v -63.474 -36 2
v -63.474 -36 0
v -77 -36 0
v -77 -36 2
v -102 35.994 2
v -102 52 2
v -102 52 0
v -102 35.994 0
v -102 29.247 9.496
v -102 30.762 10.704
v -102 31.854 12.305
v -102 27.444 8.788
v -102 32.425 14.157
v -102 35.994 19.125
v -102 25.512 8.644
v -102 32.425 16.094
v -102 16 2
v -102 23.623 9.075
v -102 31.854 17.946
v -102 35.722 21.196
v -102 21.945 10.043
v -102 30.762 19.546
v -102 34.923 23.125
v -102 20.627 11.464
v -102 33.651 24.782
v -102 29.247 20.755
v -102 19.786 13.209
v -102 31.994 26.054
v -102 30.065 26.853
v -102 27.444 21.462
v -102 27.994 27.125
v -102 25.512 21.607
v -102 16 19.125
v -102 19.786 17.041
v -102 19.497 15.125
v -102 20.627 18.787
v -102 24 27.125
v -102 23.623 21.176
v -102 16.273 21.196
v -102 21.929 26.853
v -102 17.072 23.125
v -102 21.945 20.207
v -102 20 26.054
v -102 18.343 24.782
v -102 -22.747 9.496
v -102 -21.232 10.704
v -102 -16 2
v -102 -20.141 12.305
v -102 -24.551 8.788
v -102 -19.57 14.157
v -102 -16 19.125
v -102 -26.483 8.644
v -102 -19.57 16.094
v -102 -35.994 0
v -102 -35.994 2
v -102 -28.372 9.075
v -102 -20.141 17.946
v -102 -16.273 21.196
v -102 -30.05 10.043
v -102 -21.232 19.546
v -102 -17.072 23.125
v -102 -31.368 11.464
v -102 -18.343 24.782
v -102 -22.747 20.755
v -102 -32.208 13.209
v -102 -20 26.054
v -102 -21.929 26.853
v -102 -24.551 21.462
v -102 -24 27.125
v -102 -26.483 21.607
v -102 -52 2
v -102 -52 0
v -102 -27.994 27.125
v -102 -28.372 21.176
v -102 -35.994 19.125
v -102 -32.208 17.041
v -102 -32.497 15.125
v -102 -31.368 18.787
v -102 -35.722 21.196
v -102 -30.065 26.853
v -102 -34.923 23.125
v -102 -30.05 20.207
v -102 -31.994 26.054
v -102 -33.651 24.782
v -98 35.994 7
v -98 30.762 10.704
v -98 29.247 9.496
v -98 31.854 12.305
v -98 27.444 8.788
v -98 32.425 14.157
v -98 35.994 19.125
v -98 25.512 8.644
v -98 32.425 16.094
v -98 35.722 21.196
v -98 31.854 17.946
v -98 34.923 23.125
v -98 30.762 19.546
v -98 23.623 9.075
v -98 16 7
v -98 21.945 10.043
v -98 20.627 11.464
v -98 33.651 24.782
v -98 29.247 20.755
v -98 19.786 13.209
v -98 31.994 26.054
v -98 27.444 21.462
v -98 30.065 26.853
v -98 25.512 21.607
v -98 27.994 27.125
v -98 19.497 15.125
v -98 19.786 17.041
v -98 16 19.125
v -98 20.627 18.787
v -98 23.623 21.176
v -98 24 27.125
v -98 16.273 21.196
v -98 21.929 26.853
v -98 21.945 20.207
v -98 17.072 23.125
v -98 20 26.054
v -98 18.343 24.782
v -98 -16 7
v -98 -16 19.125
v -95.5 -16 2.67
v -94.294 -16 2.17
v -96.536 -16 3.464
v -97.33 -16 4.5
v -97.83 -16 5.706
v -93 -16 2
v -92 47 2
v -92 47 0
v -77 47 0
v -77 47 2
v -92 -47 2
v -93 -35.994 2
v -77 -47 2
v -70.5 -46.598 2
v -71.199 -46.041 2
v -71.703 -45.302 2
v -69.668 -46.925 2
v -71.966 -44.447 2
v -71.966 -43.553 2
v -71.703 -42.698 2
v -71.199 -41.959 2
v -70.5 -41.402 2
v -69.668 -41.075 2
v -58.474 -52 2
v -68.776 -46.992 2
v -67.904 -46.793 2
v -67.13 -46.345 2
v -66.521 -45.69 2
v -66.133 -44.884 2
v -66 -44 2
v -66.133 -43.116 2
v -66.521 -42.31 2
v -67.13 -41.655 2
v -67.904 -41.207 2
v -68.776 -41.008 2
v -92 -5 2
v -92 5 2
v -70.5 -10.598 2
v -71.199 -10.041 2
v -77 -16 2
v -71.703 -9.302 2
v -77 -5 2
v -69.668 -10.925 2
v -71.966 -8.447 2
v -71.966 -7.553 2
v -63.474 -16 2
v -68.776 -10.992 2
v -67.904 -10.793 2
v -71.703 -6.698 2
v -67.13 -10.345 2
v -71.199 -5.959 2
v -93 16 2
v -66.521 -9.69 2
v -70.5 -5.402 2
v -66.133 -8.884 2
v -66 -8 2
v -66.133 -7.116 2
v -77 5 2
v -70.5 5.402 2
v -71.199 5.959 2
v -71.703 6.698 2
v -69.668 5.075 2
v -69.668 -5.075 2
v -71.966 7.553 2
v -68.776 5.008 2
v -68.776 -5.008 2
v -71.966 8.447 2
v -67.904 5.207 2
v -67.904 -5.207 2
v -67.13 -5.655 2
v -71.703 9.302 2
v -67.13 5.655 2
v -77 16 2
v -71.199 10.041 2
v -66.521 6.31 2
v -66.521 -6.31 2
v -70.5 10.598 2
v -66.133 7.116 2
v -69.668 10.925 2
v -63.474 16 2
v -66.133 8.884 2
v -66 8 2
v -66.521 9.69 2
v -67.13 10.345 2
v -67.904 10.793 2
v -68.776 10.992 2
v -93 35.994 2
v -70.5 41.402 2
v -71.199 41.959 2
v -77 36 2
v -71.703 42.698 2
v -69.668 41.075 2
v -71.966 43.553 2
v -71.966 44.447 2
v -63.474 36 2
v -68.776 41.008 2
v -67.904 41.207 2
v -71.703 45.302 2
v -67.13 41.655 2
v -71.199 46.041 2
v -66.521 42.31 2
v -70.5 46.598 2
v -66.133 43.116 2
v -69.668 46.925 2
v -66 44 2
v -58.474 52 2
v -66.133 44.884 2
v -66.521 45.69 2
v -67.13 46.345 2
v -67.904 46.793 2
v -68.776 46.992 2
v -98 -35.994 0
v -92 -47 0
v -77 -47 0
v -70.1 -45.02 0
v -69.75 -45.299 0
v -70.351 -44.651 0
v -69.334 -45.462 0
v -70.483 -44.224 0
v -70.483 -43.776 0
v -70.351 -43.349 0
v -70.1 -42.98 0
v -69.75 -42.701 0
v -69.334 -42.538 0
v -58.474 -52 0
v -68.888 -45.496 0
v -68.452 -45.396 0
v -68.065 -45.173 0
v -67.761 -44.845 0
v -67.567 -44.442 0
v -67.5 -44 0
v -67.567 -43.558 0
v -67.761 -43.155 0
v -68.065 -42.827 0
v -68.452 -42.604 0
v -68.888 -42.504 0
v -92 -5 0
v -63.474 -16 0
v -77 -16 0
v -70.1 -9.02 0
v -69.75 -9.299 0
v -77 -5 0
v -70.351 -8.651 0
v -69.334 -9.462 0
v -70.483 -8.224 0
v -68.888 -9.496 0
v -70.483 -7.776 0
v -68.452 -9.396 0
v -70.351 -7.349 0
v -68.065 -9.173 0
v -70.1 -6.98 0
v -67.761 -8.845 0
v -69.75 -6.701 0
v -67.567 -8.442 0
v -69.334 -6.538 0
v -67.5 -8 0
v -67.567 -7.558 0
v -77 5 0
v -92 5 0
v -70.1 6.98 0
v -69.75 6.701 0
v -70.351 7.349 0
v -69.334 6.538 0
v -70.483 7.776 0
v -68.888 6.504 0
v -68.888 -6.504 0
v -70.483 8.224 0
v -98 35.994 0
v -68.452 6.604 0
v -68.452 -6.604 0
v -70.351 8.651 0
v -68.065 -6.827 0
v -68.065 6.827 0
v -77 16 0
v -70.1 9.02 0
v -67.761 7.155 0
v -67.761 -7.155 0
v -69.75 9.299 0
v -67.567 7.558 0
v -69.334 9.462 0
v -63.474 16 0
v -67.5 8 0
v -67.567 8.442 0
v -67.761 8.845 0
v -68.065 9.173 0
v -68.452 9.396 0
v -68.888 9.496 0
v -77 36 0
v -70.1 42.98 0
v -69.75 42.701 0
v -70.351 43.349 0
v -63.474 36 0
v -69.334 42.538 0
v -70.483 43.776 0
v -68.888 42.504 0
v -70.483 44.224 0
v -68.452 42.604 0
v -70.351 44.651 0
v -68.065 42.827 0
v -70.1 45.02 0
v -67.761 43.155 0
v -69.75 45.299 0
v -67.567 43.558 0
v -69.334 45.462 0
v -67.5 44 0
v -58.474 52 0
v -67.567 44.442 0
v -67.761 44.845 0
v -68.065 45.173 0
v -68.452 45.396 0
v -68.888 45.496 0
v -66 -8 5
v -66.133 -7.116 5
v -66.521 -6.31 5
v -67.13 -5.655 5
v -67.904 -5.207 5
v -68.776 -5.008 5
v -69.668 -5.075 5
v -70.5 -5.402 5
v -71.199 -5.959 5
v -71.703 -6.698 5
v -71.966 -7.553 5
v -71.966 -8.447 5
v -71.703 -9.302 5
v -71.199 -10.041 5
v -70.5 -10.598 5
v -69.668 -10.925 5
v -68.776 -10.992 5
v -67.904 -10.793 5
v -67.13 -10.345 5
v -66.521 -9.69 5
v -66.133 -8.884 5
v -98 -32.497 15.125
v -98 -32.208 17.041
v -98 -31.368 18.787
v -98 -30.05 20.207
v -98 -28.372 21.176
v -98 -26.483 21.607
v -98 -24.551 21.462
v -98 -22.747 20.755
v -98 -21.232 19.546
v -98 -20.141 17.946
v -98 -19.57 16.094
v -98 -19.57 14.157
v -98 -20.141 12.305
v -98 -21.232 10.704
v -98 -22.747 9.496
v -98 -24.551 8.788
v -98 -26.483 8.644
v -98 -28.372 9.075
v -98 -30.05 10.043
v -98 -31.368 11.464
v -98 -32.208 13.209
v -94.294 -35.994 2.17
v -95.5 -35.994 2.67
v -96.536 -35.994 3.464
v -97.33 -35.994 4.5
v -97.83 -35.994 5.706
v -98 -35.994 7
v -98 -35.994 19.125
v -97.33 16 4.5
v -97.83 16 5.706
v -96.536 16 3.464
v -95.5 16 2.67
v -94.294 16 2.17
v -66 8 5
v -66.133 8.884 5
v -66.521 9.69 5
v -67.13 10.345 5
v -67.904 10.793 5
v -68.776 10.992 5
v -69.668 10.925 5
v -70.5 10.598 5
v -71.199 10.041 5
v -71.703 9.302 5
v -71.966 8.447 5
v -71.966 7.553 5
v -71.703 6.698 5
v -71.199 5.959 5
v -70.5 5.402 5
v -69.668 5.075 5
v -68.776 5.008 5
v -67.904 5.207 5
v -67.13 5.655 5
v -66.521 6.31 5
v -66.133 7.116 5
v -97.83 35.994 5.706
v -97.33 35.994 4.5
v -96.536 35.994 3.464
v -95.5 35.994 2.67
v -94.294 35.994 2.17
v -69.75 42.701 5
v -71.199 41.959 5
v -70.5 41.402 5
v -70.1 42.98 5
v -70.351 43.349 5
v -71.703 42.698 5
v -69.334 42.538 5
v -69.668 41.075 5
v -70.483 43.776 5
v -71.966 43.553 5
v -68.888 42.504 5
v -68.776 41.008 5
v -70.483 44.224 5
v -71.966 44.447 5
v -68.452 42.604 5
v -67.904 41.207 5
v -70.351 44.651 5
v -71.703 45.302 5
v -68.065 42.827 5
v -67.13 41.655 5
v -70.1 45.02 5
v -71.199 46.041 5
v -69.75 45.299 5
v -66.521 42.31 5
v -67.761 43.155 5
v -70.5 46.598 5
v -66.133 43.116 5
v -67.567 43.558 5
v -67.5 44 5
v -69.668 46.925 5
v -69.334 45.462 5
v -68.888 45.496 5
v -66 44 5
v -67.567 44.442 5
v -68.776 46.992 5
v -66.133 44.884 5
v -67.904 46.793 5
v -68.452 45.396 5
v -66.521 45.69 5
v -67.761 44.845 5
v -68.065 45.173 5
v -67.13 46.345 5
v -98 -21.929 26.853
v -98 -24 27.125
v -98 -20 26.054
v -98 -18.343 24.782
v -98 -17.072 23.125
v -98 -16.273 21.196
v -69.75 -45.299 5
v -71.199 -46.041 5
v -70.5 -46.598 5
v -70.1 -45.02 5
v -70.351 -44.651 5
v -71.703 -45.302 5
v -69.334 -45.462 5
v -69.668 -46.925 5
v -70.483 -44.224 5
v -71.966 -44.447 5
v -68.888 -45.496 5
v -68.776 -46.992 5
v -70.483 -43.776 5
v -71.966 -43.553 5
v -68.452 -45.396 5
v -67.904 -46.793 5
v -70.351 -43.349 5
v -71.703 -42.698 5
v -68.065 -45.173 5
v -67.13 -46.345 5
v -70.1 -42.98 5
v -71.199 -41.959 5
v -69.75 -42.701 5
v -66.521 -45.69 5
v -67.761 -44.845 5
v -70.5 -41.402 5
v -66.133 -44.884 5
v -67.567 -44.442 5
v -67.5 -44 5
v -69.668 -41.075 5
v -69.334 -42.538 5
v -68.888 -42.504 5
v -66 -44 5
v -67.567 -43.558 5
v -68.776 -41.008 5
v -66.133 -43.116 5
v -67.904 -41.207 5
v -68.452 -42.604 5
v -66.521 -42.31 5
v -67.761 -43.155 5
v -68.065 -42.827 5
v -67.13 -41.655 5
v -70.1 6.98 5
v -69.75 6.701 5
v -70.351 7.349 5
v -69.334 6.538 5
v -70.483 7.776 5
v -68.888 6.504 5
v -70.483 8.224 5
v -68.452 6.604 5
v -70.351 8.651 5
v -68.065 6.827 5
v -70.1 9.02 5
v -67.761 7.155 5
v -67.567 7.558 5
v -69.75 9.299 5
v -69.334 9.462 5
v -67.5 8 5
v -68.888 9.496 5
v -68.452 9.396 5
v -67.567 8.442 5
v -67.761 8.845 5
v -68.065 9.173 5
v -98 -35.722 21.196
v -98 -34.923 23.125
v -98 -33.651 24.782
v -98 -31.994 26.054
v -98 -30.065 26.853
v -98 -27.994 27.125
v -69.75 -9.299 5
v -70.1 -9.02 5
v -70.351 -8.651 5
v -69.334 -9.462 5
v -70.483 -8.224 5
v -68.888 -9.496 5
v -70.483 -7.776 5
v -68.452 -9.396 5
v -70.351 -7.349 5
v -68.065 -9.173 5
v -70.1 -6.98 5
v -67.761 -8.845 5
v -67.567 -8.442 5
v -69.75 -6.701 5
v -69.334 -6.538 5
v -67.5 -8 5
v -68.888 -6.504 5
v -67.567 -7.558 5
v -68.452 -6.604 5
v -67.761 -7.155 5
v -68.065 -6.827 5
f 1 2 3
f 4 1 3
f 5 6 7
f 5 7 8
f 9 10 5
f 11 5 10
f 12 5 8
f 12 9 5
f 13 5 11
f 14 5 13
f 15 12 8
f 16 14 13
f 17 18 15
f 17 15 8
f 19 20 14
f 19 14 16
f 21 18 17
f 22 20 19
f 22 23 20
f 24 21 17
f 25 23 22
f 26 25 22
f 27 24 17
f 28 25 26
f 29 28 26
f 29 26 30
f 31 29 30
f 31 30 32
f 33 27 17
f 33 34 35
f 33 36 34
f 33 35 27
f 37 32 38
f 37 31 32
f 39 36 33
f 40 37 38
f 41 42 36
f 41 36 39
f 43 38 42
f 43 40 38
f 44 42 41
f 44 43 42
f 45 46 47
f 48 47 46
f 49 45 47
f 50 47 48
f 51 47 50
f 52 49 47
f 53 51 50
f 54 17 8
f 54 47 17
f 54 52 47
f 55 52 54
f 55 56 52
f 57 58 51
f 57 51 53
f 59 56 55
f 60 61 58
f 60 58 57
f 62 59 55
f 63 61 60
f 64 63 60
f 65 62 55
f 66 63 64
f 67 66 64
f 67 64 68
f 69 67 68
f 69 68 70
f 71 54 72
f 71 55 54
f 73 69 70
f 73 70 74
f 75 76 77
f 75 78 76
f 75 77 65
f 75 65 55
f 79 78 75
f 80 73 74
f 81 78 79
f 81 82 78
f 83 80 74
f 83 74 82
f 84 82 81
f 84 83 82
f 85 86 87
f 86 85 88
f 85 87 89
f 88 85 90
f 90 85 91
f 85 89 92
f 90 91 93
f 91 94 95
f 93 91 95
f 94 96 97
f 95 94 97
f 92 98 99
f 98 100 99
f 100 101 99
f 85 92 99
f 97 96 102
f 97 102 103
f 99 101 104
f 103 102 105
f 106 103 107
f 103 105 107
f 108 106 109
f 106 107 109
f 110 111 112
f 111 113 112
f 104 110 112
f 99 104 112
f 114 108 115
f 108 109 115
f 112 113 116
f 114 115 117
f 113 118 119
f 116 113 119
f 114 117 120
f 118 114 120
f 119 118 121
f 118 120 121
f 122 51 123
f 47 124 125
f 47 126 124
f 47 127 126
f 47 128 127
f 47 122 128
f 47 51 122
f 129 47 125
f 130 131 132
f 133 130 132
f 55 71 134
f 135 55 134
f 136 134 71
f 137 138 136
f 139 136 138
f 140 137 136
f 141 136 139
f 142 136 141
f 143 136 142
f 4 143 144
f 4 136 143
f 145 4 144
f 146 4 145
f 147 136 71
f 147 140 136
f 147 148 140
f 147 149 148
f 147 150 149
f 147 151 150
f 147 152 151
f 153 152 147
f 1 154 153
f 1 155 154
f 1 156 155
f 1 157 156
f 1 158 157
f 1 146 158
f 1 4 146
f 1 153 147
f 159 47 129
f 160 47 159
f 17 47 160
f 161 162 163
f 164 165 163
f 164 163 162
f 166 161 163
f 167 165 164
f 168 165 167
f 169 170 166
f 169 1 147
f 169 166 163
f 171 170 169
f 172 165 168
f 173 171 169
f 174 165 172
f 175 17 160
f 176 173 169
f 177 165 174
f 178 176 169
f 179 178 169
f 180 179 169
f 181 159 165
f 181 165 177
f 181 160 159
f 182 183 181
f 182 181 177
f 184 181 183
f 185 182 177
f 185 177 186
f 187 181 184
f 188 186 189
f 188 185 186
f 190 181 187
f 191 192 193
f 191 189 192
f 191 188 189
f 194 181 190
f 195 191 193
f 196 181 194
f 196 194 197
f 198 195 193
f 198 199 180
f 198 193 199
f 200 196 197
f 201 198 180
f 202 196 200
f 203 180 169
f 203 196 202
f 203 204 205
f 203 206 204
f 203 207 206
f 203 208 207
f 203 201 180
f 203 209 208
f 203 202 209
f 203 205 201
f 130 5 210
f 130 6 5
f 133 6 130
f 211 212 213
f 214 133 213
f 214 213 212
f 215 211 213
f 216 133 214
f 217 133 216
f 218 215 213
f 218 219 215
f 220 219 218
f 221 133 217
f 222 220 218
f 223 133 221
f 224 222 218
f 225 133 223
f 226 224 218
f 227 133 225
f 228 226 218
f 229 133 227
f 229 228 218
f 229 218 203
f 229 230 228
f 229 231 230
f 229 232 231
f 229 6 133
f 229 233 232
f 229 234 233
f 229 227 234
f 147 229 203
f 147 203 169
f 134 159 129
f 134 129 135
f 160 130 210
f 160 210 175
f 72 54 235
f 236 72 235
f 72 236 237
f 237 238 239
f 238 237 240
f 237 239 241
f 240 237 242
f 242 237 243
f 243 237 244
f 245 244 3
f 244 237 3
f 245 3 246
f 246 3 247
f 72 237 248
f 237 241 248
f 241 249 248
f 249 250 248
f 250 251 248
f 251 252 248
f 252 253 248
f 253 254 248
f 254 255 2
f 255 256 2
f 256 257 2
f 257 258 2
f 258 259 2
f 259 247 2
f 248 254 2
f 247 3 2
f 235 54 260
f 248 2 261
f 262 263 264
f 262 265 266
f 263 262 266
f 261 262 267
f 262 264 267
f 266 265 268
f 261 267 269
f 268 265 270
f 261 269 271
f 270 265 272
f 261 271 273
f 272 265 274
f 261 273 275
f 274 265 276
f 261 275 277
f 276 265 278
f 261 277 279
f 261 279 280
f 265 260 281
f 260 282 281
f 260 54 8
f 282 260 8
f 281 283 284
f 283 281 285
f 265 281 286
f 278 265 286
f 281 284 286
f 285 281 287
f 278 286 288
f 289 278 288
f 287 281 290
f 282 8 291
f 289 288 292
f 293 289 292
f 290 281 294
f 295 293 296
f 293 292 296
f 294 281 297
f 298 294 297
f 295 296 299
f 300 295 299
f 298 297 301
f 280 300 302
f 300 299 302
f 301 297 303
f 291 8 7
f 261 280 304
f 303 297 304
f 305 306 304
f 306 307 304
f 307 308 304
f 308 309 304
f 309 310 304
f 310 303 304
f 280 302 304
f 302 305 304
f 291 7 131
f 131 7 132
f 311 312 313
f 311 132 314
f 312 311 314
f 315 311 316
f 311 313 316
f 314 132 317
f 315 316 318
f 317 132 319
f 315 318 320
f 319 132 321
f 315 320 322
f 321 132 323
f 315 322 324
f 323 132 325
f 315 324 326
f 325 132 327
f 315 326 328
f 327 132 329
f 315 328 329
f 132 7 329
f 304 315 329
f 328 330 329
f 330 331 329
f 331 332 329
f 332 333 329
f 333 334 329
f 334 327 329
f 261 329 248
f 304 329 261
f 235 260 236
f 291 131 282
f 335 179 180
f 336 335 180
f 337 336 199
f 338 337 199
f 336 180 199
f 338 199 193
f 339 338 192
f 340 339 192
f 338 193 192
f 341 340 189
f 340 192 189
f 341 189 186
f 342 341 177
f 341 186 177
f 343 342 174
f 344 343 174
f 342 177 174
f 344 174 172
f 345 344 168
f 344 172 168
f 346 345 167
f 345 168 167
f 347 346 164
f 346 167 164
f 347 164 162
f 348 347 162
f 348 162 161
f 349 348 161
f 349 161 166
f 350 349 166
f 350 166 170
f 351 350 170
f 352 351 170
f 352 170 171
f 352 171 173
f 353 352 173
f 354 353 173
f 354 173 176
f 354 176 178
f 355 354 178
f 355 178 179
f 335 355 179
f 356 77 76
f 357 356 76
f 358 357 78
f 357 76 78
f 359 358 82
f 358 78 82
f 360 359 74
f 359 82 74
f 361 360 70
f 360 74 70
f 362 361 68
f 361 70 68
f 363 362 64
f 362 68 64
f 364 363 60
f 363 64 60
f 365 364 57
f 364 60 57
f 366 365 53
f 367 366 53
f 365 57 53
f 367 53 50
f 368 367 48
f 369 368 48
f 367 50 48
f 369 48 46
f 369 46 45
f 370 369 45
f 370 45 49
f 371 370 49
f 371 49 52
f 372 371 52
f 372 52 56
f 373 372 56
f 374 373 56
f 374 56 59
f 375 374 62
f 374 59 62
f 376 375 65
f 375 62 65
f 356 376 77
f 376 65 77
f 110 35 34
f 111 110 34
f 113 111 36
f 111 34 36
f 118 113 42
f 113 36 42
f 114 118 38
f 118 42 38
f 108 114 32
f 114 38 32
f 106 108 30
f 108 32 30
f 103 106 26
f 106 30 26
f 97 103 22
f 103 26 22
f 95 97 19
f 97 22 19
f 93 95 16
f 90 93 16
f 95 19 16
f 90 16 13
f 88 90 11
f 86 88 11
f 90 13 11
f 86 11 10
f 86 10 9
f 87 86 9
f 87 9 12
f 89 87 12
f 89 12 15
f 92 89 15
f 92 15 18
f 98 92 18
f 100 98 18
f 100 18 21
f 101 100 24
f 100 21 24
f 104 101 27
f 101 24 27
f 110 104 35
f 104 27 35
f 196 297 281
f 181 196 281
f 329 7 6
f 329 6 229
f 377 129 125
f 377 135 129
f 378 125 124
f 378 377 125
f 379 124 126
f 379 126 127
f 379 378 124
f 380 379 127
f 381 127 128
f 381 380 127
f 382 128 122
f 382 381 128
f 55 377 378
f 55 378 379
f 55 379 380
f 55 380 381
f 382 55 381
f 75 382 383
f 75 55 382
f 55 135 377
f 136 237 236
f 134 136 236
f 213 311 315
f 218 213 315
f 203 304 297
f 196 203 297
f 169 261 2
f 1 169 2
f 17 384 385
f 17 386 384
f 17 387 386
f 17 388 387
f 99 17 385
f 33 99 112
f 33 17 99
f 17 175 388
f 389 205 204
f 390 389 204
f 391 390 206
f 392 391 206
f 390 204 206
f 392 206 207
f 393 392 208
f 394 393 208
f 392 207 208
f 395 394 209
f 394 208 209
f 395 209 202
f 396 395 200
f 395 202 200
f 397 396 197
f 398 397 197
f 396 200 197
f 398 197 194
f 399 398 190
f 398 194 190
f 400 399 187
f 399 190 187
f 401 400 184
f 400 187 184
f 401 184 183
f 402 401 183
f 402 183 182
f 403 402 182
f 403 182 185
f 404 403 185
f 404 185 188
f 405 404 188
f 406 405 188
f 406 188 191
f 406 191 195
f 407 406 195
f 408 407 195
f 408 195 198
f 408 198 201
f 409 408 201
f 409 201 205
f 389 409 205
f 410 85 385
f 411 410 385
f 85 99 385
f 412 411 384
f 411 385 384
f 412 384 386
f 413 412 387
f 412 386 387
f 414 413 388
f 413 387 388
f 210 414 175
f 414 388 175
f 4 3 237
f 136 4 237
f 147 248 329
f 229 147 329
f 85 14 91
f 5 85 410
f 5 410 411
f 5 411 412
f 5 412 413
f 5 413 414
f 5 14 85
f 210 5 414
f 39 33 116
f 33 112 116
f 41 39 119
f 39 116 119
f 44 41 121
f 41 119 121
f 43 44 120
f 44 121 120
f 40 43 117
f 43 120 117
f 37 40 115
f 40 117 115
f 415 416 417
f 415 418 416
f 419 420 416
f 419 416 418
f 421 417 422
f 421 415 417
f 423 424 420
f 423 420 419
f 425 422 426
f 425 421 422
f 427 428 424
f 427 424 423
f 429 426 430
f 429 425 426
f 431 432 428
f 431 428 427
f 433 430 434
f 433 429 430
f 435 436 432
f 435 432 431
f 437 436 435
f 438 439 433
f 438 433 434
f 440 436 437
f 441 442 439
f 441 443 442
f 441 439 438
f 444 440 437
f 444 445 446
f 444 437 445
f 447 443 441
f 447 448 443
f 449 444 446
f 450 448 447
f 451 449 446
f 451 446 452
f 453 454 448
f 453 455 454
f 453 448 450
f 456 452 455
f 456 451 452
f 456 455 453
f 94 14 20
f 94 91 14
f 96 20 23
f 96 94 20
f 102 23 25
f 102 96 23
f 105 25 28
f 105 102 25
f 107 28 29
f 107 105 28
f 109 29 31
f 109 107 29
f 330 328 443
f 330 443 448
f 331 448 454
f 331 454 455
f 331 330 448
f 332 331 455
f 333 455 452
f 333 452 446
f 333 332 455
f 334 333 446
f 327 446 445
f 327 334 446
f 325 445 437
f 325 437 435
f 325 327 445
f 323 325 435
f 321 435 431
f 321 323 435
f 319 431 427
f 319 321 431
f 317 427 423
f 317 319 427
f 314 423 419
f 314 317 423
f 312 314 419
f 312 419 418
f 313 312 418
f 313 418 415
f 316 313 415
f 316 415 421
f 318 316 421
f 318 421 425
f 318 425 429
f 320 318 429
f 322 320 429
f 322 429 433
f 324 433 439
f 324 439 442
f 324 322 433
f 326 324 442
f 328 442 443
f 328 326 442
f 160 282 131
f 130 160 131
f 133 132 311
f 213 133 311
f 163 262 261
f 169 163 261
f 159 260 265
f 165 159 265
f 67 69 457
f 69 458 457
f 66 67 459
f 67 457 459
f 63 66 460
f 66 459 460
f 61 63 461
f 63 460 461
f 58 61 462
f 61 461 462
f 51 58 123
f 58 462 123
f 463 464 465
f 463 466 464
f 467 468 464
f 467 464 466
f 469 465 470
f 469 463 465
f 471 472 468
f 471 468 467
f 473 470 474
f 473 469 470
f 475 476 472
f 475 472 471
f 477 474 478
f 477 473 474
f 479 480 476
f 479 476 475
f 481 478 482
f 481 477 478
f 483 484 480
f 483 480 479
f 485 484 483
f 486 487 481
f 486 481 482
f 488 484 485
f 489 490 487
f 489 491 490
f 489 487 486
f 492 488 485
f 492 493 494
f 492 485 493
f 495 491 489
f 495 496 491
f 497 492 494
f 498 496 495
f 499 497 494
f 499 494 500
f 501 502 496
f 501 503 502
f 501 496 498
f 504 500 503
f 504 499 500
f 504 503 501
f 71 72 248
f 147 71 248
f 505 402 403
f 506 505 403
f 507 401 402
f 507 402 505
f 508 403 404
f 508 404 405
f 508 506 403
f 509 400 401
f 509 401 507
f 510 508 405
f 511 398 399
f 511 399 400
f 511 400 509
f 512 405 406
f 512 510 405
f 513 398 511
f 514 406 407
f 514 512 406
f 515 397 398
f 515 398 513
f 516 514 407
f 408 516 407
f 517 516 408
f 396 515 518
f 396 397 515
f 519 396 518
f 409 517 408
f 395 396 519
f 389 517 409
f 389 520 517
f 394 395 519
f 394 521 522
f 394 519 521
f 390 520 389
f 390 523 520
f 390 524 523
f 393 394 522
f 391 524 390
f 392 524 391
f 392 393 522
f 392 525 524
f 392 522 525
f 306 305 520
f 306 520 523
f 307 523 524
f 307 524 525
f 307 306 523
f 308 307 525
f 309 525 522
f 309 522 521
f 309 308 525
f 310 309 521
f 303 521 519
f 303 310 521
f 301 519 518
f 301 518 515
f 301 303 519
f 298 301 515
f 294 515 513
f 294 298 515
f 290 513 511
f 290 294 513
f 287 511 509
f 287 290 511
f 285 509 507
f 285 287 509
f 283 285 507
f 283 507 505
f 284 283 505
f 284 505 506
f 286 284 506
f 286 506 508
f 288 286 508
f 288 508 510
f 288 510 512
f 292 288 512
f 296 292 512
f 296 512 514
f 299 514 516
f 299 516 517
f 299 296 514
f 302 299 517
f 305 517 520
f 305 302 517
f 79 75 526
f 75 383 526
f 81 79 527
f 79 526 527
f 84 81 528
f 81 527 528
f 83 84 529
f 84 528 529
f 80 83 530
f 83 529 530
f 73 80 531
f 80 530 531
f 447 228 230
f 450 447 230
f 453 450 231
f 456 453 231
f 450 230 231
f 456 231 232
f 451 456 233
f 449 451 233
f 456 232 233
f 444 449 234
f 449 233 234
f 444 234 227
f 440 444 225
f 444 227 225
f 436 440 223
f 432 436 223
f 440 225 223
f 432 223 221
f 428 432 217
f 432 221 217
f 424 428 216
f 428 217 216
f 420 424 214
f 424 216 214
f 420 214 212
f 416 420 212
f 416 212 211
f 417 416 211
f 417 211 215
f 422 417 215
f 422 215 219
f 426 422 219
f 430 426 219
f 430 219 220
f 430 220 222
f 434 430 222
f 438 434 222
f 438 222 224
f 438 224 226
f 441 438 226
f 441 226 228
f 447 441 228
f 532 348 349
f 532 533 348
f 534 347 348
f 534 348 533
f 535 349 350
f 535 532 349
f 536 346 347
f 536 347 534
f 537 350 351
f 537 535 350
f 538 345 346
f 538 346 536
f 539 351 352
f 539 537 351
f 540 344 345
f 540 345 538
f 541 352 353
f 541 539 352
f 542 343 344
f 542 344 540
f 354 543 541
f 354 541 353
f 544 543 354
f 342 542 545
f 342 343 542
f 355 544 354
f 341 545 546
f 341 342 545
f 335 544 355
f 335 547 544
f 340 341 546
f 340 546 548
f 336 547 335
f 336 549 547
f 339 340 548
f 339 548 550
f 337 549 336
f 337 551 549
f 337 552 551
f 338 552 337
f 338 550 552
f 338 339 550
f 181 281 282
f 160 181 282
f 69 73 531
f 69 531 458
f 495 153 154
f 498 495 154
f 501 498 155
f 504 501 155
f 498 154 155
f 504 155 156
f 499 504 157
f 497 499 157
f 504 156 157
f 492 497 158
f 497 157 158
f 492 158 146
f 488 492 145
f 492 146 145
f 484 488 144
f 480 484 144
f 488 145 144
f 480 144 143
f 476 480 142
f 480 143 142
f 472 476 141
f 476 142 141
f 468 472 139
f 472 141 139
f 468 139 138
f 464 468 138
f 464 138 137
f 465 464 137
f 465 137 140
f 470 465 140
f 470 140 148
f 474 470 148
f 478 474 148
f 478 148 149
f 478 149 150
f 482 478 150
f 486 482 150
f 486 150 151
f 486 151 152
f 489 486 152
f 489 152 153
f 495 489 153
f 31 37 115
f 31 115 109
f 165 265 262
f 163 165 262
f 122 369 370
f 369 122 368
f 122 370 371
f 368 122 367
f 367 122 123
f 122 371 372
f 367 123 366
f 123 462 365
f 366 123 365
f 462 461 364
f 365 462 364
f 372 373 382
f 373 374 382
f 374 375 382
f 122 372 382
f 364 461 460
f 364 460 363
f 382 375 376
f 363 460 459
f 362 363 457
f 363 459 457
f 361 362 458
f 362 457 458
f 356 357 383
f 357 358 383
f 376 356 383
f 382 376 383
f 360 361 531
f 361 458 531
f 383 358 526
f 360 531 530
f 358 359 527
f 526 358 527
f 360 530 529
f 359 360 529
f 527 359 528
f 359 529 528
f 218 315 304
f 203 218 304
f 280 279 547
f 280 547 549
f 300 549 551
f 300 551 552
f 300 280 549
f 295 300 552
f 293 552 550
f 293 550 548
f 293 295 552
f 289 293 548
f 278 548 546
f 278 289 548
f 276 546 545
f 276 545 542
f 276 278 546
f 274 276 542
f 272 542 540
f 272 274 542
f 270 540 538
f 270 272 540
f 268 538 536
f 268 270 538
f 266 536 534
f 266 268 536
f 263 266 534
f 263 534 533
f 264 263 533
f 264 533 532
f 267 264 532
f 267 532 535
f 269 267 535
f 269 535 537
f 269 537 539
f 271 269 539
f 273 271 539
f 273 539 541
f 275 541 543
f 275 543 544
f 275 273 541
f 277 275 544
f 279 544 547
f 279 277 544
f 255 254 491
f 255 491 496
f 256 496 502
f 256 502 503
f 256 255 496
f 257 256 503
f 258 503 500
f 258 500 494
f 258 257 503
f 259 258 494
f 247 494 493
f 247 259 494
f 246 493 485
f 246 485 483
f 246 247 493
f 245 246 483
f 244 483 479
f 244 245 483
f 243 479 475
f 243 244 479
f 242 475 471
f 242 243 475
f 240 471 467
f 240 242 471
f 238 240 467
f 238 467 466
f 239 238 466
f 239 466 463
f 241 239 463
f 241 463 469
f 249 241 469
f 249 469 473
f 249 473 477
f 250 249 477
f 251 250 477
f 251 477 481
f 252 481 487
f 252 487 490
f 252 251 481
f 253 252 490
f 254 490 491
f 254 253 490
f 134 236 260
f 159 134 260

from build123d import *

# Parameters (mm, degrees)
F0_R     = 3
F0_R_2   = 1.5
F1_DEPTH = 2
F0_W     = 43.5258374241
F0_H     = 104
F2_DEPTH = 5
F4_R     = 6.5
F5_DEPTH = 4
F6_R     = 5
F7_R     = 8


# Not quite as in the source:
# - a feature names something its author has since deleted; it is built from what else it names


with BuildPart() as f1:
    # F0 (on Top) → F1 (new body)
    with BuildSketch(Plane.XY):
        Polygon((21, 52), (20, 52), (-20, 52), (-21, 52), (-21, -52), (-20, -52), (20, -52), (21, -52), align=None)
        with Locations((-13, -44)):
            Circle(F0_R, mode=Mode.SUBTRACT)
        with Locations((13, -44)):
            Circle(F0_R, mode=Mode.SUBTRACT)
        with Locations((-13, -8)):
            Circle(F0_R, mode=Mode.SUBTRACT)
        Polygon((-5, -16), (-5, -5), (5, -5), (5, -16), (16, -16), (16, -36), (5, -36), (5, -47), (-5, -47), (-5, -36), (-16, -36), (-16, -16), align=None, mode=Mode.SUBTRACT)
        with Locations((13, -8)):
            Circle(F0_R, mode=Mode.SUBTRACT)
        with Locations((-13, 8)):
            Circle(F0_R, mode=Mode.SUBTRACT)
        with Locations((13, 8)):
            Circle(F0_R, mode=Mode.SUBTRACT)
        with Locations((-13, 44)):
            Circle(F0_R, mode=Mode.SUBTRACT)
        Polygon((-5, 36), (-5, 47), (5, 47), (5, 36), (16, 36), (16, 16), (5, 16), (5, 5), (-5, 5), (-5, 16), (-16, 16), (-16, 36), align=None, mode=Mode.SUBTRACT)
        with Locations((13, 44)):
            Circle(F0_R, mode=Mode.SUBTRACT)
        with Locations((-13, 8)):
            Circle(F0_R)
        with Locations((-13, 8)):
            Circle(F0_R_2, mode=Mode.SUBTRACT)
        with Locations((-13, 44)):
            Circle(F0_R)
        with Locations((-13, 44)):
            Circle(F0_R_2, mode=Mode.SUBTRACT)
    extrude(amount=F1_DEPTH)

    # F0 (on Top) → F2, piece 2 (join)
    with BuildSketch(Plane.XY):
        with Locations((-13, 8)):
            Circle(F0_R)
        with Locations((-13, 8)):
            Circle(F0_R_2, mode=Mode.SUBTRACT)
        with Locations((-13, 44)):
            Circle(F0_R)
        with Locations((-13, 44)):
            Circle(F0_R_2, mode=Mode.SUBTRACT)
        with Locations((13, 44)):
            Circle(F0_R)
        with Locations((13, 44)):
            Circle(F0_R_2, mode=Mode.SUBTRACT)
        with Locations((13, 8)):
            Circle(F0_R)
        with Locations((13, 8)):
            Circle(F0_R_2, mode=Mode.SUBTRACT)
        with Locations((-13, -8)):
            Circle(F0_R)
        with Locations((-13, -8)):
            Circle(F0_R_2, mode=Mode.SUBTRACT)
        with Locations((13, -8)):
            Circle(F0_R)
        with Locations((13, -8)):
            Circle(F0_R_2, mode=Mode.SUBTRACT)
        with Locations((-13, -44)):
            Circle(F0_R)
        with Locations((-13, -44)):
            Circle(F0_R_2, mode=Mode.SUBTRACT)
        with Locations((13, -44)):
            Circle(F0_R)
        with Locations((13, -44)):
            Circle(F0_R_2, mode=Mode.SUBTRACT)
    extrude(amount=F2_DEPTH)


with BuildPart() as f1b:
    # F0 (on Top) → F1, piece 2 (new body)
    with BuildSketch(Plane.XY):
        with Locations((-80.2370812879, 0)):
            Rectangle(F0_W, F0_H)
        with Locations((-69, -44)):
            Circle(F0_R, mode=Mode.SUBTRACT)
        Polygon((-77, -47), (-92, -47), (-92, -5), (-77, -5), (-77, -16), (-63.4741625759, -16), (-63.4741625759, -36), (-77, -36), align=None, mode=Mode.SUBTRACT)
        with Locations((-69, -8)):
            Circle(F0_R, mode=Mode.SUBTRACT)
        with Locations((-69, 8)):
            Circle(F0_R, mode=Mode.SUBTRACT)
        Polygon((-92, 47), (-77, 47), (-77, 36), (-63.4741625759, 36), (-63.4741625759, 16), (-77, 16), (-77, 5), (-92, 5), align=None, mode=Mode.SUBTRACT)
        with Locations((-69, 44)):
            Circle(F0_R, mode=Mode.SUBTRACT)
    extrude(amount=F1_DEPTH)

    # F0 (on Top) → F2 (join)
    with BuildSketch(Plane.XY):
        with Locations((-69, 44)):
            Circle(F0_R)
        with Locations((-69, 44)):
            Circle(F0_R_2, mode=Mode.SUBTRACT)
        with Locations((-69, 8)):
            Circle(F0_R)
        with Locations((-69, 8)):
            Circle(F0_R_2, mode=Mode.SUBTRACT)
        with Locations((-69, -8)):
            Circle(F0_R)
        with Locations((-69, -8)):
            Circle(F0_R_2, mode=Mode.SUBTRACT)
        with Locations((-69, -44)):
            Circle(F0_R)
        with Locations((-69, -44)):
            Circle(F0_R_2, mode=Mode.SUBTRACT)
    extrude(amount=F2_DEPTH)

    # F4 (on face) → F5 (join)
    with BuildSketch(Plane(origin=(-102, 0, 0), x_dir=(0, -1, 0), z_dir=(-1, 0, 0))):
        Polygon((-16, 27.1253478074), (-35.9944990628, 27.1253478074), (-35.9944990628, 0), (-16, 0.4690492824), align=None)
        with Locations((-25.9972495314, 15.1253478074)):
            Circle(F4_R, mode=Mode.SUBTRACT)
        Polygon((16, 0.4690492824), (35.9944990628, 0), (35.9944990628, 27.1253478074), (16, 27.1253478074), align=None)
        with Locations((25.9972495314, 15.1253478074)):
            Circle(F4_R, mode=Mode.SUBTRACT)
    extrude(amount=-F5_DEPTH)

    # F6
    f6_edges = [f1b.edges().sort_by_distance(p)[0] for p in [
        (-98, 25.99725, 2),
        (-98, -25.99725, 2),
    ]]
    fillet(f6_edges, radius=F6_R)

    # F7
    f7_edges = [f1b.edges().sort_by_distance(p)[0] for p in [
        (-100, 35.994499, 27.125348),
        (-100, -16, 27.125348),
        (-100, 16, 27.125348),
        (-100, -35.994499, 27.125348),
    ]]
    fillet(f7_edges, radius=F7_R)


solid = f1b.part
